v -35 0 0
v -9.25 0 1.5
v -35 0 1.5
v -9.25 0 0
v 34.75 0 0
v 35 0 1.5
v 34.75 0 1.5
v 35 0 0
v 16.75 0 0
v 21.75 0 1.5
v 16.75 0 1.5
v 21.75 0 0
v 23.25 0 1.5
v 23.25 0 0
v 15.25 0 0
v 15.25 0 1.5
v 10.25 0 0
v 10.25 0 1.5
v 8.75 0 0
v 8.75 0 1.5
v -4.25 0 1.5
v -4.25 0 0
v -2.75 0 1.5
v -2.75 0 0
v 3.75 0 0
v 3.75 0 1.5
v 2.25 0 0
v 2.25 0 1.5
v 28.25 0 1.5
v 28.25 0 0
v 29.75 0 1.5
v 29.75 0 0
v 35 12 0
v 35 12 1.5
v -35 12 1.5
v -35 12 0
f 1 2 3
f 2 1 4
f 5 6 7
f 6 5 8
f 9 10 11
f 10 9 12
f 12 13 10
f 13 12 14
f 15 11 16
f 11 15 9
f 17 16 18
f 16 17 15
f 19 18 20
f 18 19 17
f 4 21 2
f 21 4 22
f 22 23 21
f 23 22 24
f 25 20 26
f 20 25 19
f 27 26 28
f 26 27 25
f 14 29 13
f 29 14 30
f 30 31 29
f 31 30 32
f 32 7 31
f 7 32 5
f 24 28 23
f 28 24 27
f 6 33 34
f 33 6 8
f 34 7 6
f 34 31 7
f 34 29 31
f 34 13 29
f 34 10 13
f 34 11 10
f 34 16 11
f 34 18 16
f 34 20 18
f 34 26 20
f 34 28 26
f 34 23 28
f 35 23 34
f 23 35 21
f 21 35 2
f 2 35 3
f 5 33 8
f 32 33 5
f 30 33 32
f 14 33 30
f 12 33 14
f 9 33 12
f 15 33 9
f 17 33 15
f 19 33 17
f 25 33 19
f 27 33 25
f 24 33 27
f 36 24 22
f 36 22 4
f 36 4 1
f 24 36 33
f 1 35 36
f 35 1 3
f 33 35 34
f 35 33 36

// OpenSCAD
// 10-well comb for agarose gel casting
// Printed lying flat, teeth pointing down (-Y)

$fn = 64;

// ---- Dimensions (mm) ----
spine_len     = 70;    // spine length (X)
spine_w       = 12;    // spine width (Y)
plate_t       = 1.5;   // plate thickness (Z)
tooth_count   = 10;    // number of teeth
tooth_w       = 5.0;   // tooth width (X)
tooth_len     = 12;    // tooth length (Y)
gap           = 1.5;   // gap between teeth (X)
eps           = 0.5;   // cutter overshoot

pitch         = tooth_w + gap;   // tooth + gap pitch
row_start_x   = -(tooth_count - 1) * gap / 2;  // first tooth left edge

difference() {
    // Spine (back bar)
    translate([-spine_len / 2, 0, 0])
        cube([spine_len, spine_w, plate_t]);

    // Teeth
    for (i = [0 : tooth_count - 1])
        translate([row_start_x + i * pitch - tooth_w / 2, -tooth_len, 0])
            cube([tooth_w, tooth_len, plate_t + eps]);
}
